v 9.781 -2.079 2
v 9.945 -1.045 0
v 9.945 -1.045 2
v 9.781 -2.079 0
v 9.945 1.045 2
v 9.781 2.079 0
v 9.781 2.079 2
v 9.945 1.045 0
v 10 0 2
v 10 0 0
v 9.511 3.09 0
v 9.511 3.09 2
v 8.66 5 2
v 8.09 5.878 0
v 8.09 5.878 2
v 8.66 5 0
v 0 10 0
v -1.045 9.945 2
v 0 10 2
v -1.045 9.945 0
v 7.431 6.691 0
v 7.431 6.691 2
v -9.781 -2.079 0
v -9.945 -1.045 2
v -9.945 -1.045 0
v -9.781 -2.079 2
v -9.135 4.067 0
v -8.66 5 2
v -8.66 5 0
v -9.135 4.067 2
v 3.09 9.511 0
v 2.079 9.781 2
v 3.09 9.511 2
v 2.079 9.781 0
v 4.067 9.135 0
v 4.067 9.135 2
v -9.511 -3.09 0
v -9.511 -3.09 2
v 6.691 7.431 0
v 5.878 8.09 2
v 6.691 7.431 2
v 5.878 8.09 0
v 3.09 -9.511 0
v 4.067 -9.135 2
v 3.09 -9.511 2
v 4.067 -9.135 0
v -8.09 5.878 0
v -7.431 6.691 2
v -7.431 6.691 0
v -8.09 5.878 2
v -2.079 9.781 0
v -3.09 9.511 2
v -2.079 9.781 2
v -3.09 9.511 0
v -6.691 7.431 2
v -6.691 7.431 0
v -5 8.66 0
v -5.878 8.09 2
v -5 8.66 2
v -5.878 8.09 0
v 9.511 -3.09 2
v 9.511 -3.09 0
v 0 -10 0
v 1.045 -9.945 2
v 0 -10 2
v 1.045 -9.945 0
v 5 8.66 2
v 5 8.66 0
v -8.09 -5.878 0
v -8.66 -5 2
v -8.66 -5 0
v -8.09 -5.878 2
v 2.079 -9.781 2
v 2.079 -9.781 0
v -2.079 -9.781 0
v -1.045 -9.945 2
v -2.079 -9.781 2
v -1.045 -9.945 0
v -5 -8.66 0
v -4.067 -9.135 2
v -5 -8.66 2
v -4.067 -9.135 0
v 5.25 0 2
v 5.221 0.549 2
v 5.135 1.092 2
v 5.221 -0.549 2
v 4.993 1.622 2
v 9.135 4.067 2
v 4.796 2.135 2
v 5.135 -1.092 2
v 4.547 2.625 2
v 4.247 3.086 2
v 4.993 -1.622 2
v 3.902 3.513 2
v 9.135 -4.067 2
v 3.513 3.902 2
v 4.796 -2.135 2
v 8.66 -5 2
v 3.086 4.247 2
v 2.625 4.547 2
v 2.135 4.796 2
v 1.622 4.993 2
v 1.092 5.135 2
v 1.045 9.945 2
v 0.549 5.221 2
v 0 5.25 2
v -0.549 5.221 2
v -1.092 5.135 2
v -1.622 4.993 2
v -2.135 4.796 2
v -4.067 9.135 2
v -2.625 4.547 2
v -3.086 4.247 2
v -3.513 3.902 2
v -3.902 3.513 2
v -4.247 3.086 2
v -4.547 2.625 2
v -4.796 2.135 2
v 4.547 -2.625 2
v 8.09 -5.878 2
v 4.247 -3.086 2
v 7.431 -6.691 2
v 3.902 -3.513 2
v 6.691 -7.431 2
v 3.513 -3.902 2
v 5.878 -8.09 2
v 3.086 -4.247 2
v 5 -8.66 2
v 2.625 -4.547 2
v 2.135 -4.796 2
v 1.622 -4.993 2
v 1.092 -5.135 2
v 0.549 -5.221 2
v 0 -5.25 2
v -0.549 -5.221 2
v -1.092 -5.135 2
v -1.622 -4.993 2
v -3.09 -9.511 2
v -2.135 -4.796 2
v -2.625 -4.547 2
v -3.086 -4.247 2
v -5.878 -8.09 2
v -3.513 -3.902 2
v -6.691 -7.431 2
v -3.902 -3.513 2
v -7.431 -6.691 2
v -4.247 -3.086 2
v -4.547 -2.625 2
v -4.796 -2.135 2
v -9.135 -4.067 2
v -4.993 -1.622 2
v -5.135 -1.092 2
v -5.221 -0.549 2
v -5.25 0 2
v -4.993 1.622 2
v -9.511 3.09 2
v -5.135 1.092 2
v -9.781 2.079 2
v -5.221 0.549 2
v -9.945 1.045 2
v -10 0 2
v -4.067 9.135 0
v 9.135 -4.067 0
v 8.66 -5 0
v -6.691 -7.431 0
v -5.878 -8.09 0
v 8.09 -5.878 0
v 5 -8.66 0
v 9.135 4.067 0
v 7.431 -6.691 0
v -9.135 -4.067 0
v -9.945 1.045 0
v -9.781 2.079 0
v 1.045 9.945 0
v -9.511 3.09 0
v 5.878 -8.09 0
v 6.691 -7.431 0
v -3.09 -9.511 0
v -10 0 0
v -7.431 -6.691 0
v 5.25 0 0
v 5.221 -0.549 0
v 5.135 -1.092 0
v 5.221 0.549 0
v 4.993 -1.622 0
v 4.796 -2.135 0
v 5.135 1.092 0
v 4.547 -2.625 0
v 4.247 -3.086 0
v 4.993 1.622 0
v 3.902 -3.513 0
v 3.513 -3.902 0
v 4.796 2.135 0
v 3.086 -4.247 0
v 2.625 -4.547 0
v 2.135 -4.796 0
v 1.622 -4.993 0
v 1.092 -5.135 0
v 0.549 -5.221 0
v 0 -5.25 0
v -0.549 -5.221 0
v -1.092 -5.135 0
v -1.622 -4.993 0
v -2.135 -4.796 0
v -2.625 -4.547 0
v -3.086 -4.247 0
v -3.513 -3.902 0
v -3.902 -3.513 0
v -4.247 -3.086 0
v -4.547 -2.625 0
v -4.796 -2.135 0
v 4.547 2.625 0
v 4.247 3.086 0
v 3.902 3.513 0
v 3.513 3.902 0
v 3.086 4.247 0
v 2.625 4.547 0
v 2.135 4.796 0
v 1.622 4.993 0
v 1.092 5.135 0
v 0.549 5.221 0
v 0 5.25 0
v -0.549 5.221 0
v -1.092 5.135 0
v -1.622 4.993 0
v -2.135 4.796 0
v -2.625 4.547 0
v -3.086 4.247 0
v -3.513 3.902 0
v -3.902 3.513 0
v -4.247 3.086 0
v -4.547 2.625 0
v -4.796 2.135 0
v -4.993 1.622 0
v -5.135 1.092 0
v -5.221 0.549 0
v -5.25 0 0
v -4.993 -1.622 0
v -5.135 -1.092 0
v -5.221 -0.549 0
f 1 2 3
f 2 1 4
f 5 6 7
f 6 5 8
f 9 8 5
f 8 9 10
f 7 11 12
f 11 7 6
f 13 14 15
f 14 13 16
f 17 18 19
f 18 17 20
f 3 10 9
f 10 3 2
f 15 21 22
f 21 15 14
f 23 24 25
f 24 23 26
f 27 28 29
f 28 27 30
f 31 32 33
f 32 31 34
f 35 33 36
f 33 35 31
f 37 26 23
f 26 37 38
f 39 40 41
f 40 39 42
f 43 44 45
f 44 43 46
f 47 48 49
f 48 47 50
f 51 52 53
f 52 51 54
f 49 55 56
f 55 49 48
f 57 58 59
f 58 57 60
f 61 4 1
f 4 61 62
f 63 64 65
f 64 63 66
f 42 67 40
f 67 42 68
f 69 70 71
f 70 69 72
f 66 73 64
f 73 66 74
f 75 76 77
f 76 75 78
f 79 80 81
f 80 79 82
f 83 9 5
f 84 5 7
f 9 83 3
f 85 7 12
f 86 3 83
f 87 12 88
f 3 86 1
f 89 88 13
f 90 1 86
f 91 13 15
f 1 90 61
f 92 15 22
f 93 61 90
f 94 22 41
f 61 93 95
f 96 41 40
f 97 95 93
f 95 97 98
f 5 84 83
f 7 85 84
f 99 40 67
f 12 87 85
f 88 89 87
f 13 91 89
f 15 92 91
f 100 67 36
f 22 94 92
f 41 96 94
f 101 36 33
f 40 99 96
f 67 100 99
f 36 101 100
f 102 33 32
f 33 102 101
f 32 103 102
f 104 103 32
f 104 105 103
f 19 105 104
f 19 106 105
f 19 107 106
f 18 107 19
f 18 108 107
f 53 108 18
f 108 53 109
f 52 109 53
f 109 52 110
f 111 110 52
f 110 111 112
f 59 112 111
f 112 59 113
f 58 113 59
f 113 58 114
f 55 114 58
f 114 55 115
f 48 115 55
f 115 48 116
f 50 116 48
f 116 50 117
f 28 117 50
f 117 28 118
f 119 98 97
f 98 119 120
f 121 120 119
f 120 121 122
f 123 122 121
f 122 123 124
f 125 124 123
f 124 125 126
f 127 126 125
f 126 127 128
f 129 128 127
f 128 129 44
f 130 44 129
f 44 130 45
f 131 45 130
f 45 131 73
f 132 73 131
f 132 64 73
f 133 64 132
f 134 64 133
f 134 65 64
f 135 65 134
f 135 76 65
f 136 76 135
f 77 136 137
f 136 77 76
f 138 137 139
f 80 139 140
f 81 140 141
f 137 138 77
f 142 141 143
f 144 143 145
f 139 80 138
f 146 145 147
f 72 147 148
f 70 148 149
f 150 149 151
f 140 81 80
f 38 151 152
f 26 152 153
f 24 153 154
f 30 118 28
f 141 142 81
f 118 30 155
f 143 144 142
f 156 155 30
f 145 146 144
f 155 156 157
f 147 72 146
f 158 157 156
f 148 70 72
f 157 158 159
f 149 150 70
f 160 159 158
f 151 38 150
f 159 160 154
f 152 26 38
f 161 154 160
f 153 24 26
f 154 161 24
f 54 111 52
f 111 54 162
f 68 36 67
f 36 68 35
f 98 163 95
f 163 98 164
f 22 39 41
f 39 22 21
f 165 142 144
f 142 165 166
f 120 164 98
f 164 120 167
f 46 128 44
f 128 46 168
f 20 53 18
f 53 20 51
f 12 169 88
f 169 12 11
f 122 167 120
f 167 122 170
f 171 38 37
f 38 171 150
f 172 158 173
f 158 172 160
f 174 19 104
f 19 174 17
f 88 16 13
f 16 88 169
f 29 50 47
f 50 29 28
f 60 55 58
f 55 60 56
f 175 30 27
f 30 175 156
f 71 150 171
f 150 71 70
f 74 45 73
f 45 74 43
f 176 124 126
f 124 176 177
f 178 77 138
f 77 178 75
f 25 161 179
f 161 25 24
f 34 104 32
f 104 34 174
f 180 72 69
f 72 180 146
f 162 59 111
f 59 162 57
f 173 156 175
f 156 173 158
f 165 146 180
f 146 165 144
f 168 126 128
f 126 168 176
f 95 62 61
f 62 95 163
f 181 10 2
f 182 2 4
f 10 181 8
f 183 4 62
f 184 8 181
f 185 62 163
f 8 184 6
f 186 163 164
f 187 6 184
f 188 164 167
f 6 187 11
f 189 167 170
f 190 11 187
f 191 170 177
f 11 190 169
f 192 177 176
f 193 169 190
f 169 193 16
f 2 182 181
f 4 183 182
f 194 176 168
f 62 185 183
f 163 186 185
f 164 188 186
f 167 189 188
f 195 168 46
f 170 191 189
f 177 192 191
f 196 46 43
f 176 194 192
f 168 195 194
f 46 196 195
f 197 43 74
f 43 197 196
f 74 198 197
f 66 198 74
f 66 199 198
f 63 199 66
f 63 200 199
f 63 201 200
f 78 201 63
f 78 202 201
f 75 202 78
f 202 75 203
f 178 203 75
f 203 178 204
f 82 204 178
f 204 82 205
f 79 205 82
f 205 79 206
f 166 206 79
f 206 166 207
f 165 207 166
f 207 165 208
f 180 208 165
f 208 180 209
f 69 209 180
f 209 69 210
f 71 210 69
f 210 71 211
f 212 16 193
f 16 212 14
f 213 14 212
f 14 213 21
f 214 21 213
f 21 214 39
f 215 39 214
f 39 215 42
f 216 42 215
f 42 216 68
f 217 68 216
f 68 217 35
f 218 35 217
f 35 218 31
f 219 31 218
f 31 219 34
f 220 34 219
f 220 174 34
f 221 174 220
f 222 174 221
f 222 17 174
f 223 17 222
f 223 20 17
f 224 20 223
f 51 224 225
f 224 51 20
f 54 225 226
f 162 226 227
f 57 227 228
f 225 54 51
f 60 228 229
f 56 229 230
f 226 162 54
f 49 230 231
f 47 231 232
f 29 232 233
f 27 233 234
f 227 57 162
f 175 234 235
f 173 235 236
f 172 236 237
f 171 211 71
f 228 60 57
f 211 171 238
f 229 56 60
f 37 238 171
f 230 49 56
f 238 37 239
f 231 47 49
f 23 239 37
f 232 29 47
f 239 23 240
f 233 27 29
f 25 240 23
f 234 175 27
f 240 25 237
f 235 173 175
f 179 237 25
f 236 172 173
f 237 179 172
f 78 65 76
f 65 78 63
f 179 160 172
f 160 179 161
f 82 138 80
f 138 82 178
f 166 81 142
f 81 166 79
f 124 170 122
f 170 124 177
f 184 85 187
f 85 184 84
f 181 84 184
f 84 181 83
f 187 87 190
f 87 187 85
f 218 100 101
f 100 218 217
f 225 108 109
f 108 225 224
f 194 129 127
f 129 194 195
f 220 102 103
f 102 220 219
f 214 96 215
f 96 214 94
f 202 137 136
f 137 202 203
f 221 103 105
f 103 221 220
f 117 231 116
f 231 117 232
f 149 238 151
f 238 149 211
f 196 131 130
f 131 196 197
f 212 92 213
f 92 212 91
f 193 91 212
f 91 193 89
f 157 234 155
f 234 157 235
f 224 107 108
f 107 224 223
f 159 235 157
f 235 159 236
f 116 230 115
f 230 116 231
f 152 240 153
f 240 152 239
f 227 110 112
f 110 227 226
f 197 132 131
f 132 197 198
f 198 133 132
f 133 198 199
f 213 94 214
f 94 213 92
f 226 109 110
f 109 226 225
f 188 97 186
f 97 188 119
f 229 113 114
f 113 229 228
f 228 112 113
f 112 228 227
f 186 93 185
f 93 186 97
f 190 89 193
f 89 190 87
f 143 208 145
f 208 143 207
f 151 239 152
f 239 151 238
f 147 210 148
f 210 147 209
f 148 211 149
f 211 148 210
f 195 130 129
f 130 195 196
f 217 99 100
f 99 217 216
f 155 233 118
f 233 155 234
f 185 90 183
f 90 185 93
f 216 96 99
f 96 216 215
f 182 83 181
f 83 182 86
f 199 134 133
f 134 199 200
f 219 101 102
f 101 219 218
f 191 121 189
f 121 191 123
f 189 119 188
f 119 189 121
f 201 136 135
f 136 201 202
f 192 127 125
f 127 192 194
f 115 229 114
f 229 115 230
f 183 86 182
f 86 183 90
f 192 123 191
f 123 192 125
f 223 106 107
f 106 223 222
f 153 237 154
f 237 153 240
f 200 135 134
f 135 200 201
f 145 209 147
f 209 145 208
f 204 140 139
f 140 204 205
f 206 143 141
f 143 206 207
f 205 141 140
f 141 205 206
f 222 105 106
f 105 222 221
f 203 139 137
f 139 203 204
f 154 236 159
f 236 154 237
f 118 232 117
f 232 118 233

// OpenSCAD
// Flat metric washer.
$fn = 60;
eps = 0.02;
inner_d = 10.5;
outer_d = 20;
thickness = 2;
difference() {
    cylinder(d = outer_d, h = thickness);
    translate([0, 0, -eps]) cylinder(d = inner_d, h = thickness + 2 * eps);
}
